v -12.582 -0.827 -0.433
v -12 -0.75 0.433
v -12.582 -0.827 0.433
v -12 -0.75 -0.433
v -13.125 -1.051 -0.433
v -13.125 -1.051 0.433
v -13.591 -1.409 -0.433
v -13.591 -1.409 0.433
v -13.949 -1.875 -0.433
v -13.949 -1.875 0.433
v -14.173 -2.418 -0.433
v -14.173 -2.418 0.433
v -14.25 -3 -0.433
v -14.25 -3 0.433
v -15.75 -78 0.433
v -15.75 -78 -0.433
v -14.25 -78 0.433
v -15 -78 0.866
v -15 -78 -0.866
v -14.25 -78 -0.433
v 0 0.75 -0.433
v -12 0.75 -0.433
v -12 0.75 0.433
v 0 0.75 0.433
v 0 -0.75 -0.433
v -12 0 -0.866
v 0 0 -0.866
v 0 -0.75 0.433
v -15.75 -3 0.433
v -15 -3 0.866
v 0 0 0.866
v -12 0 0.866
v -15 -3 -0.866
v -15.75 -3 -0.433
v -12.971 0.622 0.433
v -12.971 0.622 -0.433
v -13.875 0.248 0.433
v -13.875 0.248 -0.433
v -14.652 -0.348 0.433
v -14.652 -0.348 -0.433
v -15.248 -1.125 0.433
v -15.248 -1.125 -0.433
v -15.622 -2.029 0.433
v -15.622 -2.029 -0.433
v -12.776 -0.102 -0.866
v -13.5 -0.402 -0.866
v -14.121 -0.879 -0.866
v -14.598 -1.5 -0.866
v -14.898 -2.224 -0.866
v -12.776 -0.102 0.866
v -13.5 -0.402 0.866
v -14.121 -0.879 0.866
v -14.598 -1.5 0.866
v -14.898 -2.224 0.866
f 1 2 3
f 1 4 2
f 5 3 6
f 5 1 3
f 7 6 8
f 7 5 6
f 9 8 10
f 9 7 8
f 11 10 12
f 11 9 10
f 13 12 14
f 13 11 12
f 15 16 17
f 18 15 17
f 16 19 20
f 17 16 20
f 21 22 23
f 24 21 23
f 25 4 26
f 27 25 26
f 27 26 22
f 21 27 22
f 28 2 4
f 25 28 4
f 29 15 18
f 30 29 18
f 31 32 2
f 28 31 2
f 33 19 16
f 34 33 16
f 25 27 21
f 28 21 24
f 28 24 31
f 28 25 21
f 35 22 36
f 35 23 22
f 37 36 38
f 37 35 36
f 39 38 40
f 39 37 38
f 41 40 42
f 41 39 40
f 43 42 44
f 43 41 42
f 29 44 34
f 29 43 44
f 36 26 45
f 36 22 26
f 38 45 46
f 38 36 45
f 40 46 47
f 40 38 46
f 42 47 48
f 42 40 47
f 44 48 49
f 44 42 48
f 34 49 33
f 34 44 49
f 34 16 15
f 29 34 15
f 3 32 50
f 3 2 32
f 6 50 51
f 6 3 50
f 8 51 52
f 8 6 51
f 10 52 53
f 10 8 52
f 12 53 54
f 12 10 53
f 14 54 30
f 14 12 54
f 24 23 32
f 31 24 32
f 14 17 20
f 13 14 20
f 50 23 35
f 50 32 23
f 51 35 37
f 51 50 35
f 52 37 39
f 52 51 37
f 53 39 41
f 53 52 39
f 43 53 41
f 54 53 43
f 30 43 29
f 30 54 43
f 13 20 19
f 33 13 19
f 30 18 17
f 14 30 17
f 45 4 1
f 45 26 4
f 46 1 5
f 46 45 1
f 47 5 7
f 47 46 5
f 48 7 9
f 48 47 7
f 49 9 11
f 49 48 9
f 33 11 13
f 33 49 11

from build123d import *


with BuildPart() as part:
    # 6mm: sweep along a path in Sketch1
    with BuildLine(Plane.XY) as f_6mm_path:
        Line((0, 0), (-12, 0))
        ThreePointArc((-12, 0), (-14.121320344, -0.878679656), (-15, -3))
        Line((-15, -3), (-15, -78))
    # Sketch 6m → 6mm (sweep)
    with BuildSketch(Plane(origin=(0, 0, 0), x_dir=(0, 0, -1), z_dir=(1, 0, 0))):
        Polygon((-0.866025404, 0), (-0.433012702, -0.75), (0.433012702, -0.75), (0.866025404, 0), (0.433012702, 0.75), (-0.433012702, 0.75), align=None)
    sweep(path=f_6mm_path.line)


solid = part.part
